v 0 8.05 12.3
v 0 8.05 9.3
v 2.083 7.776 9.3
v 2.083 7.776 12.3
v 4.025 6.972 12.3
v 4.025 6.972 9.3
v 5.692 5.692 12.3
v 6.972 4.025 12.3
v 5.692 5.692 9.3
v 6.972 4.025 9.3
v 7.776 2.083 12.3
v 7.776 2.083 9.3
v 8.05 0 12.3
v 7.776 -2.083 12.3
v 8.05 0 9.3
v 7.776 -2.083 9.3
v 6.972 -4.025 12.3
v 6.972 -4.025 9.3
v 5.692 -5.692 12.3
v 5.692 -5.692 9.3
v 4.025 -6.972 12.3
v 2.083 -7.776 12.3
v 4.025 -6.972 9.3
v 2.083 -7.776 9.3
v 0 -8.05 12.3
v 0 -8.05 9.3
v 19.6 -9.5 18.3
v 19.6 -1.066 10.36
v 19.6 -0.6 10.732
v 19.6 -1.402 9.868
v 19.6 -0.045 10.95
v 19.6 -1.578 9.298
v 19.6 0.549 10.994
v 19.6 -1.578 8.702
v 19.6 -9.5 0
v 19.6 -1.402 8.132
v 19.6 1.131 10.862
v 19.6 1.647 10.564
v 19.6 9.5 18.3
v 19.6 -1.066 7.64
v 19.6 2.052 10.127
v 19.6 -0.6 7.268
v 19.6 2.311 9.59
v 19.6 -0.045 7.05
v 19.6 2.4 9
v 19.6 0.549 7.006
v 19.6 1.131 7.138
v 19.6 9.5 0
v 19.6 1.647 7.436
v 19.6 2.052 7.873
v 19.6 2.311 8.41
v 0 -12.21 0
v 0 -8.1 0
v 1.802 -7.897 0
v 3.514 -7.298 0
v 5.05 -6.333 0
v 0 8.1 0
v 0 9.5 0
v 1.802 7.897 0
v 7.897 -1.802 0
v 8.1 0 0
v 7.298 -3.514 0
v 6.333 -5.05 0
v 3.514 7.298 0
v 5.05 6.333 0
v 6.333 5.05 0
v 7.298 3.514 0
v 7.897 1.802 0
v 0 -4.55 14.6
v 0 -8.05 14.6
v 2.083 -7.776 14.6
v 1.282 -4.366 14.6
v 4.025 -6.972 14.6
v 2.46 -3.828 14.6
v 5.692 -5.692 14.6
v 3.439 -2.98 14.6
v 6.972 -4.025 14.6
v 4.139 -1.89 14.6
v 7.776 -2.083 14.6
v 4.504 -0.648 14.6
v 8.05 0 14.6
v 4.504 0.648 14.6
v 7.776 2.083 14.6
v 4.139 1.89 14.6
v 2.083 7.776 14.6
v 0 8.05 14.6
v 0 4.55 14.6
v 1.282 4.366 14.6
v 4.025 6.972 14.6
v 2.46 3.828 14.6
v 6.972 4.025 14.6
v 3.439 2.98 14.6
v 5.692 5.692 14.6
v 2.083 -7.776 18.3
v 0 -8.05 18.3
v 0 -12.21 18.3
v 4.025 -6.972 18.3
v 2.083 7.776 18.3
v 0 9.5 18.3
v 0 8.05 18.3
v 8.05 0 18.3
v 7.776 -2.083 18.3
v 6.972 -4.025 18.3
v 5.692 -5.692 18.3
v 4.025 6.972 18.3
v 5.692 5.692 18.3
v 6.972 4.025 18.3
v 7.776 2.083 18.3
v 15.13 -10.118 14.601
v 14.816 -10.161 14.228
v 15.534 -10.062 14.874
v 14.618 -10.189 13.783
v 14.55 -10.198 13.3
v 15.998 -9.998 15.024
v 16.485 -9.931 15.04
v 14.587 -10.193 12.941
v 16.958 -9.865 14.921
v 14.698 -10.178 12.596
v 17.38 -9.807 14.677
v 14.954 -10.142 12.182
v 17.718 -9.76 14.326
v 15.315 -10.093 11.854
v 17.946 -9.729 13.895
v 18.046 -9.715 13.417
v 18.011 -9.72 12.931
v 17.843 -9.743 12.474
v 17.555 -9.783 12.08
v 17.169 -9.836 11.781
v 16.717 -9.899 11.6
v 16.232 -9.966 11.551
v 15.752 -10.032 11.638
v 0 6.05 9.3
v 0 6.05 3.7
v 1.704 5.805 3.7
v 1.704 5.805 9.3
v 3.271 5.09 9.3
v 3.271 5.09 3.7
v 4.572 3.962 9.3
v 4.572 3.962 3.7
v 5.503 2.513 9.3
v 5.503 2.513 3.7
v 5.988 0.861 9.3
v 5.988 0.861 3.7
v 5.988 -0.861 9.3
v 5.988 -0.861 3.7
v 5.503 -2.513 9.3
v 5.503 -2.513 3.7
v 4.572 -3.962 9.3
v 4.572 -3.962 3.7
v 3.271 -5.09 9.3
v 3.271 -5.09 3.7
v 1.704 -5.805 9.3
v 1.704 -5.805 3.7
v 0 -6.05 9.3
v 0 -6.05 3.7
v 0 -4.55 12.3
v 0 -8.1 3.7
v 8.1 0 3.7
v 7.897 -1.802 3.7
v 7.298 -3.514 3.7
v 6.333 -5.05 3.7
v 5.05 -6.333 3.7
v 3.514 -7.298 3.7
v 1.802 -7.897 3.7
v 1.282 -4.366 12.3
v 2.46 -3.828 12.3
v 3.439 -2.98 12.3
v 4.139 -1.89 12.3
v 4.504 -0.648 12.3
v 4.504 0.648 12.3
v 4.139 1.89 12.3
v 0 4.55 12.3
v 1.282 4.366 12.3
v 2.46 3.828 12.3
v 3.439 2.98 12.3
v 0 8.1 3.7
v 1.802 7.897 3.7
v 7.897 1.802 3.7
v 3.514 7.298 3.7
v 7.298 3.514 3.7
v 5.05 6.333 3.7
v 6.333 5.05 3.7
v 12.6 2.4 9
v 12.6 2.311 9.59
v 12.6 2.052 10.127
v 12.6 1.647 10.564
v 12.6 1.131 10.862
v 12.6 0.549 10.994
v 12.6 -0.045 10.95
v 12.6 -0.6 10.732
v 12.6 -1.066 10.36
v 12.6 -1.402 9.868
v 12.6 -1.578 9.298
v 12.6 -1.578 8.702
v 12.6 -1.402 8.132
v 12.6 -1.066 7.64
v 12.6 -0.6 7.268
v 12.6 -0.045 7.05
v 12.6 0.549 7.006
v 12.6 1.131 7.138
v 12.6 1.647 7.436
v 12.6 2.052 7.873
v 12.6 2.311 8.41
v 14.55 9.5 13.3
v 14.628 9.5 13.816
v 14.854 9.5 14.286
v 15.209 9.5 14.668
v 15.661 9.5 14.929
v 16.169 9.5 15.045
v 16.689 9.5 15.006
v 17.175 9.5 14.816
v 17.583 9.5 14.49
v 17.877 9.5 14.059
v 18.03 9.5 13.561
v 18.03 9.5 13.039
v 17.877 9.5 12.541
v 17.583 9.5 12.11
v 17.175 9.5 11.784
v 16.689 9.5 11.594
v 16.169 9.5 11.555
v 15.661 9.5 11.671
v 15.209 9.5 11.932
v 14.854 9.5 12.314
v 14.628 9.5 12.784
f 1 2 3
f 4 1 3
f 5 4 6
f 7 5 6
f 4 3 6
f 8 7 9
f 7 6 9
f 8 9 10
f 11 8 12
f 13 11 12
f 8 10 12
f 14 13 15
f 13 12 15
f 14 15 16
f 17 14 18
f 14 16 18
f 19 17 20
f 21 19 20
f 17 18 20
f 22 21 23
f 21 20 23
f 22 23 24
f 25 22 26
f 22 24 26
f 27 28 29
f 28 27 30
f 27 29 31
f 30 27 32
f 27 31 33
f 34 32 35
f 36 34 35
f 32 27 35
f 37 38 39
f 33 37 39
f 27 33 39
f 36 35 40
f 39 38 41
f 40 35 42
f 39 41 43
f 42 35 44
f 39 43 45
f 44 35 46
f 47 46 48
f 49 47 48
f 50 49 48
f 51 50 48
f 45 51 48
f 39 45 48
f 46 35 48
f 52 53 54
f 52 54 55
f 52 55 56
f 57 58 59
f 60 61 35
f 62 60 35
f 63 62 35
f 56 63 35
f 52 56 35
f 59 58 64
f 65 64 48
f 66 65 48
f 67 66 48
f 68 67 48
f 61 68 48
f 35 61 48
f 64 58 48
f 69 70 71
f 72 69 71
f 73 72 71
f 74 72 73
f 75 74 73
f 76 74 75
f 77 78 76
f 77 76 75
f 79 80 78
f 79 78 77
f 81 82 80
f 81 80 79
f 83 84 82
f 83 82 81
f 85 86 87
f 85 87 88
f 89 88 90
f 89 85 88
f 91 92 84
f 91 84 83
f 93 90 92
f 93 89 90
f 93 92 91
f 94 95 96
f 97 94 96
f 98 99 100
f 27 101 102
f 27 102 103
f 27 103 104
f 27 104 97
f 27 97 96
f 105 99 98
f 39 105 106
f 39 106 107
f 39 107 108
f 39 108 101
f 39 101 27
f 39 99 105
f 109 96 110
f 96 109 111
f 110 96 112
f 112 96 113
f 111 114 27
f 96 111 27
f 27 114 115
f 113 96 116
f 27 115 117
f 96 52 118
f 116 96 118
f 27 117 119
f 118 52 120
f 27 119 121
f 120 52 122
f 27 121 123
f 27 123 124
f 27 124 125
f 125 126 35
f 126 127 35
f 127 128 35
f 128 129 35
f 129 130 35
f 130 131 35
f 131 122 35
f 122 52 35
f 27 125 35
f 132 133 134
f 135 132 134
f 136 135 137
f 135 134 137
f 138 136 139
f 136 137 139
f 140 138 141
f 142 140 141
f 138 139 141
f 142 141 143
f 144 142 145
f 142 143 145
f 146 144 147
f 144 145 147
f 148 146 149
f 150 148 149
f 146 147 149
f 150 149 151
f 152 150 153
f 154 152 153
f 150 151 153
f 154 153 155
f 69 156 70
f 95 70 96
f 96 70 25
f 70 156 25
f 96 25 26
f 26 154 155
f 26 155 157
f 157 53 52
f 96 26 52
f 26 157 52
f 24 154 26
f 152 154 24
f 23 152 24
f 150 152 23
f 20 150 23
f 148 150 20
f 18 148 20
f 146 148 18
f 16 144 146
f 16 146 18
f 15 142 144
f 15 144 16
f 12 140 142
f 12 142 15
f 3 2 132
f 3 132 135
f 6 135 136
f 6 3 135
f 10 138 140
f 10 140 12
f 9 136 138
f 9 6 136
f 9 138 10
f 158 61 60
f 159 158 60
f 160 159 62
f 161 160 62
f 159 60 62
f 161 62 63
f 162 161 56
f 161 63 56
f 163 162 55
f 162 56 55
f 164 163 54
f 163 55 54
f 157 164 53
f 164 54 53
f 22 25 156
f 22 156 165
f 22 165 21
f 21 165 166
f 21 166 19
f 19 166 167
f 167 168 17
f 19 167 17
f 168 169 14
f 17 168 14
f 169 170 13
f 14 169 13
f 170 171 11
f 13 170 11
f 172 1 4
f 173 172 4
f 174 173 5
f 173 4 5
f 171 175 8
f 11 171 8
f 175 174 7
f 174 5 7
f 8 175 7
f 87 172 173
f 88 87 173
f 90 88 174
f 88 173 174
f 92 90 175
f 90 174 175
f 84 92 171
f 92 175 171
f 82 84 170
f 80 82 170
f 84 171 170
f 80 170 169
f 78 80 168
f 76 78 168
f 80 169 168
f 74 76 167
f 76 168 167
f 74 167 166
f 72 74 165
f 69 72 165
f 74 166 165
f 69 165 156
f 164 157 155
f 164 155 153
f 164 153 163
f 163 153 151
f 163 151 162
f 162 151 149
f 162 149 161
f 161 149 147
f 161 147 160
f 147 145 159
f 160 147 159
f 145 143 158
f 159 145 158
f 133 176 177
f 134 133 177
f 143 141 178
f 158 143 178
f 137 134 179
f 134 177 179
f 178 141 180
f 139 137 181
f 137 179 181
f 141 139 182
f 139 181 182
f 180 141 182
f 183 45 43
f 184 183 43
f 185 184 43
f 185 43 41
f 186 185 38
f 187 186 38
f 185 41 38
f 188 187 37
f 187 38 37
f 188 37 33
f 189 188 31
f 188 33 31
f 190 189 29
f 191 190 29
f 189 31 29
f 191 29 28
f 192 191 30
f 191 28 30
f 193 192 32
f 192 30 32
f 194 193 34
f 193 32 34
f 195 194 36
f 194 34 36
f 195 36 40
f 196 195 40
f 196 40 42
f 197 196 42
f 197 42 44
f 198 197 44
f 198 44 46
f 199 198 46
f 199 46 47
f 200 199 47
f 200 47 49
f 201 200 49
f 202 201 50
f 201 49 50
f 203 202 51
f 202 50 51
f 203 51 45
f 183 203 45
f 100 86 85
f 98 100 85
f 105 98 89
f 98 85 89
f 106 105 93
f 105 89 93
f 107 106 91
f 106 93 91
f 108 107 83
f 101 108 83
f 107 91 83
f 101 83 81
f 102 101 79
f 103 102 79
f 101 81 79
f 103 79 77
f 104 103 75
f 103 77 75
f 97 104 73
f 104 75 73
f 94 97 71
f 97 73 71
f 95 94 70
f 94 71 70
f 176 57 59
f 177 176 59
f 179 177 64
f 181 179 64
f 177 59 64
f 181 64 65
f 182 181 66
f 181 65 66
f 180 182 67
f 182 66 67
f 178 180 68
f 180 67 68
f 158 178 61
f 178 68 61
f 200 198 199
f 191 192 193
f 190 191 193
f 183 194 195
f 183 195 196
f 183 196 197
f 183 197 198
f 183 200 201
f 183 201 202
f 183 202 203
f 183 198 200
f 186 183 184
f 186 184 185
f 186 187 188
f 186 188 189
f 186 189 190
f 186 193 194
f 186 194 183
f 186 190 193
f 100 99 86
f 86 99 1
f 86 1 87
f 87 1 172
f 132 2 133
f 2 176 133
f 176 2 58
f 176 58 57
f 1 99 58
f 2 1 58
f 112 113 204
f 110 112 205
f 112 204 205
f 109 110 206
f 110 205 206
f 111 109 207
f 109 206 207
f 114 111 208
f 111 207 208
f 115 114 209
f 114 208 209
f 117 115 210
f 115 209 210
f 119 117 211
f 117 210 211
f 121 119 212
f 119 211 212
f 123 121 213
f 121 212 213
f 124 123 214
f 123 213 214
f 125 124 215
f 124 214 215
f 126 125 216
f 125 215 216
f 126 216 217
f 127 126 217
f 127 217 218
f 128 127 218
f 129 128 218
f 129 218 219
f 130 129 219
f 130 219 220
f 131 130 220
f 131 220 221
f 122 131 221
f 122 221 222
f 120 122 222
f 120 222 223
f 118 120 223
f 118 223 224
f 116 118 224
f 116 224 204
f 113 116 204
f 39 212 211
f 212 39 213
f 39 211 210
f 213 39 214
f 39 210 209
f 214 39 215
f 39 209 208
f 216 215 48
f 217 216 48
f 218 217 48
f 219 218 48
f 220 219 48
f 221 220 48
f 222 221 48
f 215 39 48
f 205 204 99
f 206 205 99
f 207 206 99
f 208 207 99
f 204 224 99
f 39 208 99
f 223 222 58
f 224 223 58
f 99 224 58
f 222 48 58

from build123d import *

# Parameters (mm, degrees)
F1_DEPTH       = 3.7
F3_DEPTH       = 5.6
F5_DEPTH       = 3
F7_DEPTH       = 2.3
F9_DEPTH       = 3.7
F11_DEPTH      = 25
F11_DEPTH_BACK = 25
F12_R          = 2
F13_DEPTH      = 7
F14_R          = 1.75
F15_DEPTH      = 25


with BuildPart() as f1:
    # F0 (on Top) → F1 (new body)
    with BuildSketch(Plane.XY):
        with BuildLine():
            Line((19.6, 9.5), (0, 12.21))
            Line((0, 12.21), (0, 8.1))
            ThreePointArc((0, 8.1), (5.7275649276, 5.7275649276), (8.1, 0))
            ThreePointArc((8.1, 0), (5.7275649276, -5.7275649276), (0, -8.1))
            Line((0, -8.1), (0, -12.21))
            Line((0, -12.21), (19.6, -9.5))
            Line((19.6, -9.5), (19.6, 0))
            Line((19.6, 0), (19.6, 9.5))
        make_face()
    extrude(amount=F1_DEPTH)

    # F2 (on face) → F3 (join)
    with BuildSketch(Plane.XY.offset(3.7)):
        with BuildLine():
            ThreePointArc((0, 6.05), (6.05, 0), (0, -6.05))
            Line((0, -6.05), (0, -8.1))
            Line((0, -8.1), (0, -12.21))
            Line((0, -12.21), (19.6, -9.5))
            Line((19.6, -9.5), (19.6, 9.5))
            Line((19.6, 9.5), (0, 12.21))
            Line((0, 12.21), (0, 8.1))
            Line((0, 8.1), (0, 6.05))
        make_face()
    extrude(amount=F3_DEPTH)

    # F4 (on face) → F5 (join)
    with BuildSketch(Plane.XY.offset(9.3)):
        with BuildLine():
            ThreePointArc((0, 8.05), (8.05, 0), (0, -8.05))
            Line((0, -8.05), (0, -12.21))
            Line((0, -12.21), (19.6, -9.5))
            Line((19.6, -9.5), (19.6, 9.5))
            Line((19.6, 9.5), (0, 12.21))
            Line((0, 12.21), (0, 8.05))
        make_face()
    extrude(amount=F5_DEPTH)

    # F6 (on face) → F7 (join)
    with BuildSketch(Plane.XY.offset(12.3)):
        with BuildLine():
            ThreePointArc((0, 4.55), (4.55, 0), (0, -4.55))
            Line((0, -4.55), (0, -12.21))
            Line((0, -12.21), (19.6, -9.5))
            Line((19.6, -9.5), (19.6, 9.5))
            Line((19.6, 9.5), (0, 12.21))
            Line((0, 12.21), (0, 4.55))
        make_face()
    extrude(amount=F7_DEPTH)

    # F8 (on face) → F9 (join)
    with BuildSketch(Plane.XY.offset(14.6)):
        with BuildLine():
            ThreePointArc((0, 8.05), (8.05, 0), (0, -8.05))
            Line((0, -8.05), (0, -12.21))
            Line((0, -12.21), (19.6, -9.5))
            Line((19.6, -9.5), (19.6, 9.5))
            Line((19.6, 9.5), (0, 12.21))
            Line((0, 12.21), (0, 8.05))
        make_face()
    extrude(amount=F9_DEPTH)

    # F10 (on face) → F11 (cut, two sides)
    with BuildSketch(Plane(origin=(0, 0, 0), x_dir=(1, 0, 0), z_dir=(0, 0, -1))) as f11_sk:
        Polygon((0, -12.21), (19.6, -9.5), (0, -9.5), align=None)
    extrude(amount=-F11_DEPTH, mode=Mode.SUBTRACT)
    extrude(f11_sk.sketch, amount=F11_DEPTH_BACK, mode=Mode.SUBTRACT)

    # F12 (on face) → F13 (cut)
    with BuildSketch(Plane.YZ.offset(19.6)):
        with Locations((0.4, 9)):
            Circle(F12_R)
    extrude(amount=-F13_DEPTH, mode=Mode.SUBTRACT)

    # F14 (on face) → F15 (cut)
    with BuildSketch(Plane(origin=(0, 9.5, 0), x_dir=(-1, 0, 0), z_dir=(0, 1, 0))):
        with Locations((-16.3, 13.3)):
            Circle(F14_R)
    extrude(amount=-F15_DEPTH, mode=Mode.SUBTRACT)


solid = f1.part
